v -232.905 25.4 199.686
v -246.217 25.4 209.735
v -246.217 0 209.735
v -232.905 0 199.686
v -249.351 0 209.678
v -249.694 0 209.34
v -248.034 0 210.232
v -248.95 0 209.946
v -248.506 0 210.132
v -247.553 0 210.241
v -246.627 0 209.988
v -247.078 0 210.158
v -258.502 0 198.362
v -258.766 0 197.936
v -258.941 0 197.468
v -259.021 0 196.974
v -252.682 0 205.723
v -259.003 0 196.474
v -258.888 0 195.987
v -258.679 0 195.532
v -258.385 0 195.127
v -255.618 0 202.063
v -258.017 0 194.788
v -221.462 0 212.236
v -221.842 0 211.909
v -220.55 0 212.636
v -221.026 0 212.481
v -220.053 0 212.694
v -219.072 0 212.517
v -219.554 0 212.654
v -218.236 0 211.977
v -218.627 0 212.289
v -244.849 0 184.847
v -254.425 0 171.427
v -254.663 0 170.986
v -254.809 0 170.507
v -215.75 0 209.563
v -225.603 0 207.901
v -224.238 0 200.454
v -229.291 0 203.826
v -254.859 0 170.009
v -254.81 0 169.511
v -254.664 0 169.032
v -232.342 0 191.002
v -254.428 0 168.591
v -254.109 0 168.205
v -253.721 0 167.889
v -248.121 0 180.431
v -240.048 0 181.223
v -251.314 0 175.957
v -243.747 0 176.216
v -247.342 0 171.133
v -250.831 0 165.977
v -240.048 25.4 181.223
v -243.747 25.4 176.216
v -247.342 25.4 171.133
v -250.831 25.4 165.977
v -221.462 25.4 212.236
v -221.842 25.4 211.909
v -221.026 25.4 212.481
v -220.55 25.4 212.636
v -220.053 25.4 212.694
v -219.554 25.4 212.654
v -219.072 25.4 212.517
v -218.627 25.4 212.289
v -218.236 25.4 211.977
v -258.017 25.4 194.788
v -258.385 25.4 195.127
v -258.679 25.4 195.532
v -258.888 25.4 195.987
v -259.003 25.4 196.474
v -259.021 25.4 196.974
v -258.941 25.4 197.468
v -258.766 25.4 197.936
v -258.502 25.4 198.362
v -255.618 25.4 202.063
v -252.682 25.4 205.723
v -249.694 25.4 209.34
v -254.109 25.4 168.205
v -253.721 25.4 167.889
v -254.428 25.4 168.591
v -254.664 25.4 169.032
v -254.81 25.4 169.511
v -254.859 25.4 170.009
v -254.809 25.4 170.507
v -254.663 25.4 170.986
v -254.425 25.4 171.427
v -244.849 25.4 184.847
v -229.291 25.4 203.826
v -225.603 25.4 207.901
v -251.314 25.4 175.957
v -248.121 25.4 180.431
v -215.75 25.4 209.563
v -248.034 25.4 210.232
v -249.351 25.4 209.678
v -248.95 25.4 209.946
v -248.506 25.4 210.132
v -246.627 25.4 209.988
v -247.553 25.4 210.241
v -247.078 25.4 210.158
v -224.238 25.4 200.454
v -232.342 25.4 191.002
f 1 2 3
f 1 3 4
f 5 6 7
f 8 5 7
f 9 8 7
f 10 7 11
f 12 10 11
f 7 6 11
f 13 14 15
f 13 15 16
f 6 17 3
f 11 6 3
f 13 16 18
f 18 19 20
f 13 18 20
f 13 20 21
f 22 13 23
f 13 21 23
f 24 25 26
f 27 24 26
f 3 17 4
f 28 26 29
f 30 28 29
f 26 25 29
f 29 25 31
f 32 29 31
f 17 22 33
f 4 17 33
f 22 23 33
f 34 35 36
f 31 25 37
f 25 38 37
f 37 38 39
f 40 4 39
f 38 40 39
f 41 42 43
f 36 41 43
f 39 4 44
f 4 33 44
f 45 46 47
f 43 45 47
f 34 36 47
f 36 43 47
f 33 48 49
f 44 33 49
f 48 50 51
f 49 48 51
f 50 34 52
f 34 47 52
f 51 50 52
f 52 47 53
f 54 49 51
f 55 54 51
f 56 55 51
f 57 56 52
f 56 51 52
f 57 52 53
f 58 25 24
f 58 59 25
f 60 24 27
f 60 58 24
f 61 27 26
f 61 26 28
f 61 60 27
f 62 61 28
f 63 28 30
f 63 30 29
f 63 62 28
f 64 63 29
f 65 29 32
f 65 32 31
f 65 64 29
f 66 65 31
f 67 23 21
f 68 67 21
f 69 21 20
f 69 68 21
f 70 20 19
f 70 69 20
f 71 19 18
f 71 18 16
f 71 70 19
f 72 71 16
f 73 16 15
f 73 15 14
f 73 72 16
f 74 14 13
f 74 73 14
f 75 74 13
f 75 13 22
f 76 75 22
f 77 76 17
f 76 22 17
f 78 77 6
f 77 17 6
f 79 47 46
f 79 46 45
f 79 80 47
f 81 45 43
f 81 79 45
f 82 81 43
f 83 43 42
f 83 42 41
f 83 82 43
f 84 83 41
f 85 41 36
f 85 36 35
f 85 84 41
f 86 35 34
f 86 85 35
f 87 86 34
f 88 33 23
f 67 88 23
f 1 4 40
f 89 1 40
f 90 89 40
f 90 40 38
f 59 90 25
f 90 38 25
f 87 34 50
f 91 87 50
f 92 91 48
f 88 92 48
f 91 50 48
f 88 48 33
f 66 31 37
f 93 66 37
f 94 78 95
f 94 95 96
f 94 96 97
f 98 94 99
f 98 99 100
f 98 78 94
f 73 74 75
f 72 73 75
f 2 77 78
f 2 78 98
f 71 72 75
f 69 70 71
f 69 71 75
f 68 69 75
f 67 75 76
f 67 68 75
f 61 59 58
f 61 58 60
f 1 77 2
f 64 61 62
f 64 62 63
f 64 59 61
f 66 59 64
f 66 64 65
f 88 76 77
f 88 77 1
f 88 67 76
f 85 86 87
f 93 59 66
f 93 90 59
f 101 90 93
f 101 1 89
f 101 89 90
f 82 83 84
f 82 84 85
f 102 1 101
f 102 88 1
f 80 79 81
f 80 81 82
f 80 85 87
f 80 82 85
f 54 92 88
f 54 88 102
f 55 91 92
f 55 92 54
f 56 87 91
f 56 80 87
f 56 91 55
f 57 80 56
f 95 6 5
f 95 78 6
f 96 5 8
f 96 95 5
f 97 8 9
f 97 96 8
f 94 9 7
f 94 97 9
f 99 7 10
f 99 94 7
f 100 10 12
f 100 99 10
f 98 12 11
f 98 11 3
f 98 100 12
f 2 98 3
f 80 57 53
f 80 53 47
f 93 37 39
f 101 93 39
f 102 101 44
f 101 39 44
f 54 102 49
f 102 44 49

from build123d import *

# Parameters (mm, degrees)
BOSS_EXTRUDE1_DEPTH = 25.4
FILLET1_R           = 2.54


with BuildPart() as part:
    # Sketch1 → Boss-Extrude1 (new body)
    with BuildSketch(Plane(origin=(0, 0, 0), x_dir=(1, 0, 0), z_dir=(0, 1, 0))):
        with BuildLine():
            Line((-244.848924974, -184.847069368), (-240.047965661, -181.222617027))
            ThreePointArc((-240.047965661, -181.222617027), (-245.557867235, -173.683610566), (-250.831084415, -165.977196721))
            Line((-250.831084415, -165.977196721), (-255.847706103, -169.296740655))
            ThreePointArc((-255.847706103, -169.296740655), (-250.469024579, -177.157282777), (-244.848924974, -184.847069368))
        make_face()
        with BuildLine():
            ThreePointArc((-215.750093665, -209.562782535), (-228.339131483, -195.770027771), (-240.047965661, -181.222617027))
            Line((-240.047965661, -181.222617027), (-244.848924974, -184.847069368))
            ThreePointArc((-244.848924974, -184.847069368), (-238.99238799, -192.359230601), (-232.905461186, -199.685956603))
            ThreePointArc((-232.905461186, -199.685956603), (-226.594481496, -206.819670414), (-220.065095538, -213.754038186))
            Line((-220.065095538, -213.754038186), (-215.750093665, -209.562782535))
        make_face()
        with BuildLine():
            ThreePointArc((-232.905461186, -199.685956603), (-238.99238799, -192.359230601), (-244.848924974, -184.847069368))
            Line((-244.848924974, -184.847069368), (-260.051962799, -196.32450178))
            ThreePointArc((-260.051962799, -196.32450178), (-254.20265496, -203.841466748), (-248.136139057, -211.184255684))
            Line((-248.136139057, -211.184255684), (-232.905461186, -199.685956603))
        make_face()
    extrude(amount=BOSS_EXTRUDE1_DEPTH)

    # Fillet1
    fillet1_edges = [part.edges().sort_by_distance(p)[0] for p in [
        (-220.065095538, 12.7, 213.754038186),
        (-248.136139057, 12.7, 211.184255684),
        (-260.051962799, 12.7, 196.32450178),
        (-255.847706103, 12.7, 169.296740655),
    ]]
    fillet(fillet1_edges, radius=FILLET1_R)


solid = part.part
